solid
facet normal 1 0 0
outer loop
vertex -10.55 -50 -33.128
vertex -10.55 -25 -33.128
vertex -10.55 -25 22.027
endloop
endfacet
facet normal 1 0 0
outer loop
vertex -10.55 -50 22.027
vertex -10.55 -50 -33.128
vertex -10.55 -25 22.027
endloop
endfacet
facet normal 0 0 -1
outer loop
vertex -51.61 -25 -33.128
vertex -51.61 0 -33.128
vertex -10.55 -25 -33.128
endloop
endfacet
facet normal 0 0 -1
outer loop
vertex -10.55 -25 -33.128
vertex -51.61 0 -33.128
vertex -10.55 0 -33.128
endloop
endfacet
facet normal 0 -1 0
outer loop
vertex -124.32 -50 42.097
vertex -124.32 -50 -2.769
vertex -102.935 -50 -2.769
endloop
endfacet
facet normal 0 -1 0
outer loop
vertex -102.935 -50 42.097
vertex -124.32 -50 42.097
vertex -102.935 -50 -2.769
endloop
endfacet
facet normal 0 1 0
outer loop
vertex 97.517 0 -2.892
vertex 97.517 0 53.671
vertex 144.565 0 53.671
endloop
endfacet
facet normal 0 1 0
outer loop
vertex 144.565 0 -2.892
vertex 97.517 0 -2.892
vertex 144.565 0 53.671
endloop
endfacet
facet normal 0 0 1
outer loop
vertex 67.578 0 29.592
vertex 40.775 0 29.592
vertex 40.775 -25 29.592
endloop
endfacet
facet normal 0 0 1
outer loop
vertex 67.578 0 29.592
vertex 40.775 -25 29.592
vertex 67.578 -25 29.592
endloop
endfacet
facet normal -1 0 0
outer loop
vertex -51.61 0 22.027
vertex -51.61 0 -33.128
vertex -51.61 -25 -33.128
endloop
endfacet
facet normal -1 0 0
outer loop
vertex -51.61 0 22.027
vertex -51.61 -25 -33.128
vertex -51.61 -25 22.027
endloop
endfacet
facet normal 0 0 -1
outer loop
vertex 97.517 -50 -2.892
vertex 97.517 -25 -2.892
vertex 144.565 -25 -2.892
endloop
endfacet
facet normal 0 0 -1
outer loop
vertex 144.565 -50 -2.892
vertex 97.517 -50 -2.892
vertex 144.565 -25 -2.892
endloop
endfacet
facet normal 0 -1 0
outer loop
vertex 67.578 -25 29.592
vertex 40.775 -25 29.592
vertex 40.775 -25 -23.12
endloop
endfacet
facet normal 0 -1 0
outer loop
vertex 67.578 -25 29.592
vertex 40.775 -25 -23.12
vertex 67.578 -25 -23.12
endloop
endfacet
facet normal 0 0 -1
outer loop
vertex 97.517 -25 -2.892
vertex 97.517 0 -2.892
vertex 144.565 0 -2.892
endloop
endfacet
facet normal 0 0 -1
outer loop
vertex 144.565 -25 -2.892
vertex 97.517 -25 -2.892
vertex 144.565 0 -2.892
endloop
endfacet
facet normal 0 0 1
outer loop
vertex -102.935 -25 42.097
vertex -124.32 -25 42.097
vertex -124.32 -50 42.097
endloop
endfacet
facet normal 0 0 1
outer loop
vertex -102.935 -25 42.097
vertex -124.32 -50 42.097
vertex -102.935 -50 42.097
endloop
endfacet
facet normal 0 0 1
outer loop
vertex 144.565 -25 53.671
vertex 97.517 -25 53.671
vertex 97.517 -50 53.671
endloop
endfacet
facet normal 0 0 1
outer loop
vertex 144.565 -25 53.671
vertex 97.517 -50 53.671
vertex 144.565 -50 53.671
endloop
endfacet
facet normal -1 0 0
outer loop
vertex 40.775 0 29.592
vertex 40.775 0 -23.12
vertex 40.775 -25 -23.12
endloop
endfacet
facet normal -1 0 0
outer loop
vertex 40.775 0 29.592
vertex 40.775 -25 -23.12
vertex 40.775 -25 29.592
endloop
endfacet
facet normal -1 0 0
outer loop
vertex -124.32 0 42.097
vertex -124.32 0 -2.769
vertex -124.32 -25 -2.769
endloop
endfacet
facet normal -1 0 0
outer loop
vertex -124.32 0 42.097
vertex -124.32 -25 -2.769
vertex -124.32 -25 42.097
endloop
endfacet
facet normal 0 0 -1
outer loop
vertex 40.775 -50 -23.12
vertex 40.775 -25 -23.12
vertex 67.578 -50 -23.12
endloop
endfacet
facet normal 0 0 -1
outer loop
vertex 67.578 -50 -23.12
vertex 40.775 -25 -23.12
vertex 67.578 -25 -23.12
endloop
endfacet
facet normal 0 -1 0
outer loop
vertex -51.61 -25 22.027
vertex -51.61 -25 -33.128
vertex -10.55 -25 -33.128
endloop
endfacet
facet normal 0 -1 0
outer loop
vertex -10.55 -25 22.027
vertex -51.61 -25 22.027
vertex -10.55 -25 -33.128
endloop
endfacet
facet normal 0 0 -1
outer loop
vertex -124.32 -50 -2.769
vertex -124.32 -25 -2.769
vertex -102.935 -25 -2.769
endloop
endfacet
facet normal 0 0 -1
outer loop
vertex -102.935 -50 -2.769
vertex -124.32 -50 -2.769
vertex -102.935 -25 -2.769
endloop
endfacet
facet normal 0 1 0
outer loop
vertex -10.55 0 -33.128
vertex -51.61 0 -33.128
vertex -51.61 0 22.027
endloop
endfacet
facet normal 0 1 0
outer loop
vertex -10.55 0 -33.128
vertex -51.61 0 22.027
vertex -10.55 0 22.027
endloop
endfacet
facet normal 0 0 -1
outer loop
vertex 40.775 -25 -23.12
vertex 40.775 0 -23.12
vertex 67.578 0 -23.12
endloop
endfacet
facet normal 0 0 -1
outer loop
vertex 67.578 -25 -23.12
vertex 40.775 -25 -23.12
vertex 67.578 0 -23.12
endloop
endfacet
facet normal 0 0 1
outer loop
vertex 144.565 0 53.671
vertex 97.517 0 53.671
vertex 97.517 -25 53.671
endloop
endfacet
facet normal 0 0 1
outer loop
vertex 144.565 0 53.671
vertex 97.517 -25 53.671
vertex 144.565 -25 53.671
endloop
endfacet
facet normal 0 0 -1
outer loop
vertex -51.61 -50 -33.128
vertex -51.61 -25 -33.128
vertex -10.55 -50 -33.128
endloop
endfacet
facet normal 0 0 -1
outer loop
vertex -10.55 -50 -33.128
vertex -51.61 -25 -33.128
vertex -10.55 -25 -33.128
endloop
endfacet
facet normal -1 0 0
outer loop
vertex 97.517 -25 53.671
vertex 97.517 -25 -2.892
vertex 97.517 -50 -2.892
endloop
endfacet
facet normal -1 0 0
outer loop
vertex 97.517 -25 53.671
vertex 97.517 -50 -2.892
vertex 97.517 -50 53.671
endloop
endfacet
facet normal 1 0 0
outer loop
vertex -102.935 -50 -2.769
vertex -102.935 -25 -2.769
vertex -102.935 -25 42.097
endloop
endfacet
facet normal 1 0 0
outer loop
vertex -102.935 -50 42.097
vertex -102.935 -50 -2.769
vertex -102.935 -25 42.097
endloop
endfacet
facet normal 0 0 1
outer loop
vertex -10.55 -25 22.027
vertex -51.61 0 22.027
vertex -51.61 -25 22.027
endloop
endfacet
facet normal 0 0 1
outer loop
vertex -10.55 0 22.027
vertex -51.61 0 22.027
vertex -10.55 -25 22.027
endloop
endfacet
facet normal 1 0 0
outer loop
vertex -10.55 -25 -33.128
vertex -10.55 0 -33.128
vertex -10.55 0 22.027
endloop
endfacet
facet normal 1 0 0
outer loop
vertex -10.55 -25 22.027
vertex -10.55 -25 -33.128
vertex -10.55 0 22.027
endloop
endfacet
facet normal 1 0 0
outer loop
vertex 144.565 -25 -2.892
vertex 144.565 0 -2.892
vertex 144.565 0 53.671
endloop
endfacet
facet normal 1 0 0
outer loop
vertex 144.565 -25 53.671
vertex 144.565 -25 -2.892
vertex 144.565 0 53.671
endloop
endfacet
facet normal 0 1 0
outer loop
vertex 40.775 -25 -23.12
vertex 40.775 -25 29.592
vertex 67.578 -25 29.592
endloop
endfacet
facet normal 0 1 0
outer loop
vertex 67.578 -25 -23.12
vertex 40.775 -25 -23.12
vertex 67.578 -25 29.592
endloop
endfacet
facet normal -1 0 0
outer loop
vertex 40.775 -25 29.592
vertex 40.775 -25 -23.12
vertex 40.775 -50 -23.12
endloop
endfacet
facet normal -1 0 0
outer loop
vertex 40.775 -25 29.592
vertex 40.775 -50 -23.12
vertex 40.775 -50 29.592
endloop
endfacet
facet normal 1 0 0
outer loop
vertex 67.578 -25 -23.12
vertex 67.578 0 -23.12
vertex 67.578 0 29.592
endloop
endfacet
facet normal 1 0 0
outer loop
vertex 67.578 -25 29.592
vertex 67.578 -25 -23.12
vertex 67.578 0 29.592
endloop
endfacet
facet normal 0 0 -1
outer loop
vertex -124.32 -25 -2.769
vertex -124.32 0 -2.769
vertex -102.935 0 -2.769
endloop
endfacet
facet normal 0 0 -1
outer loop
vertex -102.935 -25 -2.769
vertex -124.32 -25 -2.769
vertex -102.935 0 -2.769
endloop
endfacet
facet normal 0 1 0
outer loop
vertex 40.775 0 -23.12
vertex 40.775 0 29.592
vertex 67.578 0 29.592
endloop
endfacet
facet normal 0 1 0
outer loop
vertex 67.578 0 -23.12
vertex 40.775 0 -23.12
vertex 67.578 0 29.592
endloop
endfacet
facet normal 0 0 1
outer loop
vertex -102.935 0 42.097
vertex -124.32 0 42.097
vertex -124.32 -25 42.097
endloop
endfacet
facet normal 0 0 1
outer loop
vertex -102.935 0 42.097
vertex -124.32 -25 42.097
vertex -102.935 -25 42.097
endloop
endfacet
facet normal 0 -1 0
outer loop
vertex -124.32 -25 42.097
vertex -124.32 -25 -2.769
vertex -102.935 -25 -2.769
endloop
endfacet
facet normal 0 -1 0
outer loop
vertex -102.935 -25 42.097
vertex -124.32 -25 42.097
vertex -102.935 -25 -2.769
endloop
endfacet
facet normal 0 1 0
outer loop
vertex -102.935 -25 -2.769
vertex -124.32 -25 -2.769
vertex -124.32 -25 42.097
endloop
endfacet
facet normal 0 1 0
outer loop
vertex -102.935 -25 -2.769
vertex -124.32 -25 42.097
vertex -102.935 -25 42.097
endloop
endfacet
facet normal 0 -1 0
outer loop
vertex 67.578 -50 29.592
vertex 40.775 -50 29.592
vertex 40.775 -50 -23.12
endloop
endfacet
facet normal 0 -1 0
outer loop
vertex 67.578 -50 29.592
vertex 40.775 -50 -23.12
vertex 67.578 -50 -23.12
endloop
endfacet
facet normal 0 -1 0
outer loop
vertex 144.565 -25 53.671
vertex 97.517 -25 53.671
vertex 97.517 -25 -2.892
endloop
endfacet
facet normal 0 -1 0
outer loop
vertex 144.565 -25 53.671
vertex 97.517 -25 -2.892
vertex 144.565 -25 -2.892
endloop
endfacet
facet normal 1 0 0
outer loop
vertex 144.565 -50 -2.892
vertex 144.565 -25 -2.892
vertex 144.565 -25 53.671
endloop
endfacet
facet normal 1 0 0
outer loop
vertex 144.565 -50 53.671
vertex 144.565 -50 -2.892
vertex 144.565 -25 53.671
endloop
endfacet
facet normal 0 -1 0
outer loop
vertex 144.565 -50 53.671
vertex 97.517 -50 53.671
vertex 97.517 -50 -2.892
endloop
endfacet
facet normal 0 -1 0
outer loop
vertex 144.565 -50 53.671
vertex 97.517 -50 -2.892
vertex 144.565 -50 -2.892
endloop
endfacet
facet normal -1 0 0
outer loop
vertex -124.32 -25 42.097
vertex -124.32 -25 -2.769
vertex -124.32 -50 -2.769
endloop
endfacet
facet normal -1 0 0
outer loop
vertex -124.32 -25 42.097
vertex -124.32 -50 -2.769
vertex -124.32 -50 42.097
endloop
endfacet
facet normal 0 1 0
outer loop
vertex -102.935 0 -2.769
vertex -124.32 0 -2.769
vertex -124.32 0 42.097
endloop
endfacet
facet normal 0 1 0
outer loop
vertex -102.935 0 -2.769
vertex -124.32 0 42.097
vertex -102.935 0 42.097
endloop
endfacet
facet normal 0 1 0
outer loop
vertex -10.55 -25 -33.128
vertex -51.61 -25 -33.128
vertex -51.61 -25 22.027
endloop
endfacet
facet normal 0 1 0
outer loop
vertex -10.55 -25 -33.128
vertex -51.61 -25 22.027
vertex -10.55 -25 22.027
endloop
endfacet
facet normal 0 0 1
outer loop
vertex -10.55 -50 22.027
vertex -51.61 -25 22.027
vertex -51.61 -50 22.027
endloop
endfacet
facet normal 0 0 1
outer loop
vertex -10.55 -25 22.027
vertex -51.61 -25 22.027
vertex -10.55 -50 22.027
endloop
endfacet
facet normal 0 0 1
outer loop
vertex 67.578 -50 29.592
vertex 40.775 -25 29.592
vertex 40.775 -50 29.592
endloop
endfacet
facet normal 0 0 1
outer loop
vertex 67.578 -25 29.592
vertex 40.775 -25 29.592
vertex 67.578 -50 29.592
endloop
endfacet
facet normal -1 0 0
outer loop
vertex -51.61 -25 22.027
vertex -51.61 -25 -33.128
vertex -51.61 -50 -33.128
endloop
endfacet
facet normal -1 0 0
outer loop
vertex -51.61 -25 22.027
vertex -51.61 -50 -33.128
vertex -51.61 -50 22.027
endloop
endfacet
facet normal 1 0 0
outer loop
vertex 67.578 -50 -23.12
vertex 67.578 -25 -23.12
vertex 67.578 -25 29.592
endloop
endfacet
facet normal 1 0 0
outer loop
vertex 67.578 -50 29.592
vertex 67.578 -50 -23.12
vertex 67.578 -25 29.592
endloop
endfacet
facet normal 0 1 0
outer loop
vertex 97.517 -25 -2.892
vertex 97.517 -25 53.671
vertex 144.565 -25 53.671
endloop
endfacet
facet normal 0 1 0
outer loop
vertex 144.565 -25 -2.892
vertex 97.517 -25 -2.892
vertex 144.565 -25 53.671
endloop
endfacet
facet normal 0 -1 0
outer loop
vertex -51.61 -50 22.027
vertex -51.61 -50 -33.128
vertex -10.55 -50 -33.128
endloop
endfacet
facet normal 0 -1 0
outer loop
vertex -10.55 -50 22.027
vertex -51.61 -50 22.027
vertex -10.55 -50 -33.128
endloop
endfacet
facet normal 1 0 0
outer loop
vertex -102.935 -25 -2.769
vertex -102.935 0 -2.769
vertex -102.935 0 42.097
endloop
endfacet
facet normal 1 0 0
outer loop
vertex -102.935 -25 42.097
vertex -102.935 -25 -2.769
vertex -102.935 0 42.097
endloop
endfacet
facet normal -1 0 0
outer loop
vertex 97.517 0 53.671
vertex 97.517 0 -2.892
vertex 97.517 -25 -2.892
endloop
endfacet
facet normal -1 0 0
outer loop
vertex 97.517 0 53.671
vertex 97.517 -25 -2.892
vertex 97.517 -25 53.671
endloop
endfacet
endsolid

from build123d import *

# Parameters (mm, degrees)
F0_W        = 21.38535
F0_H        = 44.866281
F0_W_2      = 41.059875
F0_H_2      = 55.154471
F0_W_3      = 26.802976
F0_H_3      = 52.711906
F0_W_4      = 47.047779
F0_H_4      = 56.562428
F1_DEPTH    = 25
F1_FACE_W   = 21.38535
F1_FACE_H   = 44.866282
F1_FACE_W_2 = 41.059875
F1_FACE_H_2 = 55.154471
F1_FACE_W_3 = 26.802976
F1_FACE_H_3 = 52.711906
F1_FACE_W_4 = 47.047779
F1_FACE_H_4 = 56.562429
F2_DEPTH    = 25


with BuildPart() as f1:
    # F0 (on Front) → F1 (new body)
    with BuildSketch(Plane.XZ):
        with Locations((-113.627497, 19.663958)):
            Rectangle(F0_W, F0_H)
        with Locations((-31.080044, -5.550382)):
            Rectangle(F0_W_2, F0_H_2)
        with Locations((54.176217, 3.235822)):
            Rectangle(F0_W_3, F0_H_3)
        with Locations((121.041081, 25.389427)):
            Rectangle(F0_W_4, F0_H_4)
    extrude(amount=F1_DEPTH)


with BuildPart() as f2:
    # F1_face (on face) → F2 (new body)
    with BuildSketch(Plane(origin=(-113.627497, -25, 19.663958), x_dir=(1, 0, 0), z_dir=(0, -1, 0))):
        Rectangle(F1_FACE_W, F1_FACE_H)
        with Locations((82.547452, -25.21434)):
            Rectangle(F1_FACE_W_2, F1_FACE_H_2)
        with Locations((167.803714, -16.428137)):
            Rectangle(F1_FACE_W_3, F1_FACE_H_3)
        with Locations((234.668578, 5.725468)):
            Rectangle(F1_FACE_W_4, F1_FACE_H_4)
    extrude(amount=F2_DEPTH)


solid = Compound([f1.part, f2.part])
